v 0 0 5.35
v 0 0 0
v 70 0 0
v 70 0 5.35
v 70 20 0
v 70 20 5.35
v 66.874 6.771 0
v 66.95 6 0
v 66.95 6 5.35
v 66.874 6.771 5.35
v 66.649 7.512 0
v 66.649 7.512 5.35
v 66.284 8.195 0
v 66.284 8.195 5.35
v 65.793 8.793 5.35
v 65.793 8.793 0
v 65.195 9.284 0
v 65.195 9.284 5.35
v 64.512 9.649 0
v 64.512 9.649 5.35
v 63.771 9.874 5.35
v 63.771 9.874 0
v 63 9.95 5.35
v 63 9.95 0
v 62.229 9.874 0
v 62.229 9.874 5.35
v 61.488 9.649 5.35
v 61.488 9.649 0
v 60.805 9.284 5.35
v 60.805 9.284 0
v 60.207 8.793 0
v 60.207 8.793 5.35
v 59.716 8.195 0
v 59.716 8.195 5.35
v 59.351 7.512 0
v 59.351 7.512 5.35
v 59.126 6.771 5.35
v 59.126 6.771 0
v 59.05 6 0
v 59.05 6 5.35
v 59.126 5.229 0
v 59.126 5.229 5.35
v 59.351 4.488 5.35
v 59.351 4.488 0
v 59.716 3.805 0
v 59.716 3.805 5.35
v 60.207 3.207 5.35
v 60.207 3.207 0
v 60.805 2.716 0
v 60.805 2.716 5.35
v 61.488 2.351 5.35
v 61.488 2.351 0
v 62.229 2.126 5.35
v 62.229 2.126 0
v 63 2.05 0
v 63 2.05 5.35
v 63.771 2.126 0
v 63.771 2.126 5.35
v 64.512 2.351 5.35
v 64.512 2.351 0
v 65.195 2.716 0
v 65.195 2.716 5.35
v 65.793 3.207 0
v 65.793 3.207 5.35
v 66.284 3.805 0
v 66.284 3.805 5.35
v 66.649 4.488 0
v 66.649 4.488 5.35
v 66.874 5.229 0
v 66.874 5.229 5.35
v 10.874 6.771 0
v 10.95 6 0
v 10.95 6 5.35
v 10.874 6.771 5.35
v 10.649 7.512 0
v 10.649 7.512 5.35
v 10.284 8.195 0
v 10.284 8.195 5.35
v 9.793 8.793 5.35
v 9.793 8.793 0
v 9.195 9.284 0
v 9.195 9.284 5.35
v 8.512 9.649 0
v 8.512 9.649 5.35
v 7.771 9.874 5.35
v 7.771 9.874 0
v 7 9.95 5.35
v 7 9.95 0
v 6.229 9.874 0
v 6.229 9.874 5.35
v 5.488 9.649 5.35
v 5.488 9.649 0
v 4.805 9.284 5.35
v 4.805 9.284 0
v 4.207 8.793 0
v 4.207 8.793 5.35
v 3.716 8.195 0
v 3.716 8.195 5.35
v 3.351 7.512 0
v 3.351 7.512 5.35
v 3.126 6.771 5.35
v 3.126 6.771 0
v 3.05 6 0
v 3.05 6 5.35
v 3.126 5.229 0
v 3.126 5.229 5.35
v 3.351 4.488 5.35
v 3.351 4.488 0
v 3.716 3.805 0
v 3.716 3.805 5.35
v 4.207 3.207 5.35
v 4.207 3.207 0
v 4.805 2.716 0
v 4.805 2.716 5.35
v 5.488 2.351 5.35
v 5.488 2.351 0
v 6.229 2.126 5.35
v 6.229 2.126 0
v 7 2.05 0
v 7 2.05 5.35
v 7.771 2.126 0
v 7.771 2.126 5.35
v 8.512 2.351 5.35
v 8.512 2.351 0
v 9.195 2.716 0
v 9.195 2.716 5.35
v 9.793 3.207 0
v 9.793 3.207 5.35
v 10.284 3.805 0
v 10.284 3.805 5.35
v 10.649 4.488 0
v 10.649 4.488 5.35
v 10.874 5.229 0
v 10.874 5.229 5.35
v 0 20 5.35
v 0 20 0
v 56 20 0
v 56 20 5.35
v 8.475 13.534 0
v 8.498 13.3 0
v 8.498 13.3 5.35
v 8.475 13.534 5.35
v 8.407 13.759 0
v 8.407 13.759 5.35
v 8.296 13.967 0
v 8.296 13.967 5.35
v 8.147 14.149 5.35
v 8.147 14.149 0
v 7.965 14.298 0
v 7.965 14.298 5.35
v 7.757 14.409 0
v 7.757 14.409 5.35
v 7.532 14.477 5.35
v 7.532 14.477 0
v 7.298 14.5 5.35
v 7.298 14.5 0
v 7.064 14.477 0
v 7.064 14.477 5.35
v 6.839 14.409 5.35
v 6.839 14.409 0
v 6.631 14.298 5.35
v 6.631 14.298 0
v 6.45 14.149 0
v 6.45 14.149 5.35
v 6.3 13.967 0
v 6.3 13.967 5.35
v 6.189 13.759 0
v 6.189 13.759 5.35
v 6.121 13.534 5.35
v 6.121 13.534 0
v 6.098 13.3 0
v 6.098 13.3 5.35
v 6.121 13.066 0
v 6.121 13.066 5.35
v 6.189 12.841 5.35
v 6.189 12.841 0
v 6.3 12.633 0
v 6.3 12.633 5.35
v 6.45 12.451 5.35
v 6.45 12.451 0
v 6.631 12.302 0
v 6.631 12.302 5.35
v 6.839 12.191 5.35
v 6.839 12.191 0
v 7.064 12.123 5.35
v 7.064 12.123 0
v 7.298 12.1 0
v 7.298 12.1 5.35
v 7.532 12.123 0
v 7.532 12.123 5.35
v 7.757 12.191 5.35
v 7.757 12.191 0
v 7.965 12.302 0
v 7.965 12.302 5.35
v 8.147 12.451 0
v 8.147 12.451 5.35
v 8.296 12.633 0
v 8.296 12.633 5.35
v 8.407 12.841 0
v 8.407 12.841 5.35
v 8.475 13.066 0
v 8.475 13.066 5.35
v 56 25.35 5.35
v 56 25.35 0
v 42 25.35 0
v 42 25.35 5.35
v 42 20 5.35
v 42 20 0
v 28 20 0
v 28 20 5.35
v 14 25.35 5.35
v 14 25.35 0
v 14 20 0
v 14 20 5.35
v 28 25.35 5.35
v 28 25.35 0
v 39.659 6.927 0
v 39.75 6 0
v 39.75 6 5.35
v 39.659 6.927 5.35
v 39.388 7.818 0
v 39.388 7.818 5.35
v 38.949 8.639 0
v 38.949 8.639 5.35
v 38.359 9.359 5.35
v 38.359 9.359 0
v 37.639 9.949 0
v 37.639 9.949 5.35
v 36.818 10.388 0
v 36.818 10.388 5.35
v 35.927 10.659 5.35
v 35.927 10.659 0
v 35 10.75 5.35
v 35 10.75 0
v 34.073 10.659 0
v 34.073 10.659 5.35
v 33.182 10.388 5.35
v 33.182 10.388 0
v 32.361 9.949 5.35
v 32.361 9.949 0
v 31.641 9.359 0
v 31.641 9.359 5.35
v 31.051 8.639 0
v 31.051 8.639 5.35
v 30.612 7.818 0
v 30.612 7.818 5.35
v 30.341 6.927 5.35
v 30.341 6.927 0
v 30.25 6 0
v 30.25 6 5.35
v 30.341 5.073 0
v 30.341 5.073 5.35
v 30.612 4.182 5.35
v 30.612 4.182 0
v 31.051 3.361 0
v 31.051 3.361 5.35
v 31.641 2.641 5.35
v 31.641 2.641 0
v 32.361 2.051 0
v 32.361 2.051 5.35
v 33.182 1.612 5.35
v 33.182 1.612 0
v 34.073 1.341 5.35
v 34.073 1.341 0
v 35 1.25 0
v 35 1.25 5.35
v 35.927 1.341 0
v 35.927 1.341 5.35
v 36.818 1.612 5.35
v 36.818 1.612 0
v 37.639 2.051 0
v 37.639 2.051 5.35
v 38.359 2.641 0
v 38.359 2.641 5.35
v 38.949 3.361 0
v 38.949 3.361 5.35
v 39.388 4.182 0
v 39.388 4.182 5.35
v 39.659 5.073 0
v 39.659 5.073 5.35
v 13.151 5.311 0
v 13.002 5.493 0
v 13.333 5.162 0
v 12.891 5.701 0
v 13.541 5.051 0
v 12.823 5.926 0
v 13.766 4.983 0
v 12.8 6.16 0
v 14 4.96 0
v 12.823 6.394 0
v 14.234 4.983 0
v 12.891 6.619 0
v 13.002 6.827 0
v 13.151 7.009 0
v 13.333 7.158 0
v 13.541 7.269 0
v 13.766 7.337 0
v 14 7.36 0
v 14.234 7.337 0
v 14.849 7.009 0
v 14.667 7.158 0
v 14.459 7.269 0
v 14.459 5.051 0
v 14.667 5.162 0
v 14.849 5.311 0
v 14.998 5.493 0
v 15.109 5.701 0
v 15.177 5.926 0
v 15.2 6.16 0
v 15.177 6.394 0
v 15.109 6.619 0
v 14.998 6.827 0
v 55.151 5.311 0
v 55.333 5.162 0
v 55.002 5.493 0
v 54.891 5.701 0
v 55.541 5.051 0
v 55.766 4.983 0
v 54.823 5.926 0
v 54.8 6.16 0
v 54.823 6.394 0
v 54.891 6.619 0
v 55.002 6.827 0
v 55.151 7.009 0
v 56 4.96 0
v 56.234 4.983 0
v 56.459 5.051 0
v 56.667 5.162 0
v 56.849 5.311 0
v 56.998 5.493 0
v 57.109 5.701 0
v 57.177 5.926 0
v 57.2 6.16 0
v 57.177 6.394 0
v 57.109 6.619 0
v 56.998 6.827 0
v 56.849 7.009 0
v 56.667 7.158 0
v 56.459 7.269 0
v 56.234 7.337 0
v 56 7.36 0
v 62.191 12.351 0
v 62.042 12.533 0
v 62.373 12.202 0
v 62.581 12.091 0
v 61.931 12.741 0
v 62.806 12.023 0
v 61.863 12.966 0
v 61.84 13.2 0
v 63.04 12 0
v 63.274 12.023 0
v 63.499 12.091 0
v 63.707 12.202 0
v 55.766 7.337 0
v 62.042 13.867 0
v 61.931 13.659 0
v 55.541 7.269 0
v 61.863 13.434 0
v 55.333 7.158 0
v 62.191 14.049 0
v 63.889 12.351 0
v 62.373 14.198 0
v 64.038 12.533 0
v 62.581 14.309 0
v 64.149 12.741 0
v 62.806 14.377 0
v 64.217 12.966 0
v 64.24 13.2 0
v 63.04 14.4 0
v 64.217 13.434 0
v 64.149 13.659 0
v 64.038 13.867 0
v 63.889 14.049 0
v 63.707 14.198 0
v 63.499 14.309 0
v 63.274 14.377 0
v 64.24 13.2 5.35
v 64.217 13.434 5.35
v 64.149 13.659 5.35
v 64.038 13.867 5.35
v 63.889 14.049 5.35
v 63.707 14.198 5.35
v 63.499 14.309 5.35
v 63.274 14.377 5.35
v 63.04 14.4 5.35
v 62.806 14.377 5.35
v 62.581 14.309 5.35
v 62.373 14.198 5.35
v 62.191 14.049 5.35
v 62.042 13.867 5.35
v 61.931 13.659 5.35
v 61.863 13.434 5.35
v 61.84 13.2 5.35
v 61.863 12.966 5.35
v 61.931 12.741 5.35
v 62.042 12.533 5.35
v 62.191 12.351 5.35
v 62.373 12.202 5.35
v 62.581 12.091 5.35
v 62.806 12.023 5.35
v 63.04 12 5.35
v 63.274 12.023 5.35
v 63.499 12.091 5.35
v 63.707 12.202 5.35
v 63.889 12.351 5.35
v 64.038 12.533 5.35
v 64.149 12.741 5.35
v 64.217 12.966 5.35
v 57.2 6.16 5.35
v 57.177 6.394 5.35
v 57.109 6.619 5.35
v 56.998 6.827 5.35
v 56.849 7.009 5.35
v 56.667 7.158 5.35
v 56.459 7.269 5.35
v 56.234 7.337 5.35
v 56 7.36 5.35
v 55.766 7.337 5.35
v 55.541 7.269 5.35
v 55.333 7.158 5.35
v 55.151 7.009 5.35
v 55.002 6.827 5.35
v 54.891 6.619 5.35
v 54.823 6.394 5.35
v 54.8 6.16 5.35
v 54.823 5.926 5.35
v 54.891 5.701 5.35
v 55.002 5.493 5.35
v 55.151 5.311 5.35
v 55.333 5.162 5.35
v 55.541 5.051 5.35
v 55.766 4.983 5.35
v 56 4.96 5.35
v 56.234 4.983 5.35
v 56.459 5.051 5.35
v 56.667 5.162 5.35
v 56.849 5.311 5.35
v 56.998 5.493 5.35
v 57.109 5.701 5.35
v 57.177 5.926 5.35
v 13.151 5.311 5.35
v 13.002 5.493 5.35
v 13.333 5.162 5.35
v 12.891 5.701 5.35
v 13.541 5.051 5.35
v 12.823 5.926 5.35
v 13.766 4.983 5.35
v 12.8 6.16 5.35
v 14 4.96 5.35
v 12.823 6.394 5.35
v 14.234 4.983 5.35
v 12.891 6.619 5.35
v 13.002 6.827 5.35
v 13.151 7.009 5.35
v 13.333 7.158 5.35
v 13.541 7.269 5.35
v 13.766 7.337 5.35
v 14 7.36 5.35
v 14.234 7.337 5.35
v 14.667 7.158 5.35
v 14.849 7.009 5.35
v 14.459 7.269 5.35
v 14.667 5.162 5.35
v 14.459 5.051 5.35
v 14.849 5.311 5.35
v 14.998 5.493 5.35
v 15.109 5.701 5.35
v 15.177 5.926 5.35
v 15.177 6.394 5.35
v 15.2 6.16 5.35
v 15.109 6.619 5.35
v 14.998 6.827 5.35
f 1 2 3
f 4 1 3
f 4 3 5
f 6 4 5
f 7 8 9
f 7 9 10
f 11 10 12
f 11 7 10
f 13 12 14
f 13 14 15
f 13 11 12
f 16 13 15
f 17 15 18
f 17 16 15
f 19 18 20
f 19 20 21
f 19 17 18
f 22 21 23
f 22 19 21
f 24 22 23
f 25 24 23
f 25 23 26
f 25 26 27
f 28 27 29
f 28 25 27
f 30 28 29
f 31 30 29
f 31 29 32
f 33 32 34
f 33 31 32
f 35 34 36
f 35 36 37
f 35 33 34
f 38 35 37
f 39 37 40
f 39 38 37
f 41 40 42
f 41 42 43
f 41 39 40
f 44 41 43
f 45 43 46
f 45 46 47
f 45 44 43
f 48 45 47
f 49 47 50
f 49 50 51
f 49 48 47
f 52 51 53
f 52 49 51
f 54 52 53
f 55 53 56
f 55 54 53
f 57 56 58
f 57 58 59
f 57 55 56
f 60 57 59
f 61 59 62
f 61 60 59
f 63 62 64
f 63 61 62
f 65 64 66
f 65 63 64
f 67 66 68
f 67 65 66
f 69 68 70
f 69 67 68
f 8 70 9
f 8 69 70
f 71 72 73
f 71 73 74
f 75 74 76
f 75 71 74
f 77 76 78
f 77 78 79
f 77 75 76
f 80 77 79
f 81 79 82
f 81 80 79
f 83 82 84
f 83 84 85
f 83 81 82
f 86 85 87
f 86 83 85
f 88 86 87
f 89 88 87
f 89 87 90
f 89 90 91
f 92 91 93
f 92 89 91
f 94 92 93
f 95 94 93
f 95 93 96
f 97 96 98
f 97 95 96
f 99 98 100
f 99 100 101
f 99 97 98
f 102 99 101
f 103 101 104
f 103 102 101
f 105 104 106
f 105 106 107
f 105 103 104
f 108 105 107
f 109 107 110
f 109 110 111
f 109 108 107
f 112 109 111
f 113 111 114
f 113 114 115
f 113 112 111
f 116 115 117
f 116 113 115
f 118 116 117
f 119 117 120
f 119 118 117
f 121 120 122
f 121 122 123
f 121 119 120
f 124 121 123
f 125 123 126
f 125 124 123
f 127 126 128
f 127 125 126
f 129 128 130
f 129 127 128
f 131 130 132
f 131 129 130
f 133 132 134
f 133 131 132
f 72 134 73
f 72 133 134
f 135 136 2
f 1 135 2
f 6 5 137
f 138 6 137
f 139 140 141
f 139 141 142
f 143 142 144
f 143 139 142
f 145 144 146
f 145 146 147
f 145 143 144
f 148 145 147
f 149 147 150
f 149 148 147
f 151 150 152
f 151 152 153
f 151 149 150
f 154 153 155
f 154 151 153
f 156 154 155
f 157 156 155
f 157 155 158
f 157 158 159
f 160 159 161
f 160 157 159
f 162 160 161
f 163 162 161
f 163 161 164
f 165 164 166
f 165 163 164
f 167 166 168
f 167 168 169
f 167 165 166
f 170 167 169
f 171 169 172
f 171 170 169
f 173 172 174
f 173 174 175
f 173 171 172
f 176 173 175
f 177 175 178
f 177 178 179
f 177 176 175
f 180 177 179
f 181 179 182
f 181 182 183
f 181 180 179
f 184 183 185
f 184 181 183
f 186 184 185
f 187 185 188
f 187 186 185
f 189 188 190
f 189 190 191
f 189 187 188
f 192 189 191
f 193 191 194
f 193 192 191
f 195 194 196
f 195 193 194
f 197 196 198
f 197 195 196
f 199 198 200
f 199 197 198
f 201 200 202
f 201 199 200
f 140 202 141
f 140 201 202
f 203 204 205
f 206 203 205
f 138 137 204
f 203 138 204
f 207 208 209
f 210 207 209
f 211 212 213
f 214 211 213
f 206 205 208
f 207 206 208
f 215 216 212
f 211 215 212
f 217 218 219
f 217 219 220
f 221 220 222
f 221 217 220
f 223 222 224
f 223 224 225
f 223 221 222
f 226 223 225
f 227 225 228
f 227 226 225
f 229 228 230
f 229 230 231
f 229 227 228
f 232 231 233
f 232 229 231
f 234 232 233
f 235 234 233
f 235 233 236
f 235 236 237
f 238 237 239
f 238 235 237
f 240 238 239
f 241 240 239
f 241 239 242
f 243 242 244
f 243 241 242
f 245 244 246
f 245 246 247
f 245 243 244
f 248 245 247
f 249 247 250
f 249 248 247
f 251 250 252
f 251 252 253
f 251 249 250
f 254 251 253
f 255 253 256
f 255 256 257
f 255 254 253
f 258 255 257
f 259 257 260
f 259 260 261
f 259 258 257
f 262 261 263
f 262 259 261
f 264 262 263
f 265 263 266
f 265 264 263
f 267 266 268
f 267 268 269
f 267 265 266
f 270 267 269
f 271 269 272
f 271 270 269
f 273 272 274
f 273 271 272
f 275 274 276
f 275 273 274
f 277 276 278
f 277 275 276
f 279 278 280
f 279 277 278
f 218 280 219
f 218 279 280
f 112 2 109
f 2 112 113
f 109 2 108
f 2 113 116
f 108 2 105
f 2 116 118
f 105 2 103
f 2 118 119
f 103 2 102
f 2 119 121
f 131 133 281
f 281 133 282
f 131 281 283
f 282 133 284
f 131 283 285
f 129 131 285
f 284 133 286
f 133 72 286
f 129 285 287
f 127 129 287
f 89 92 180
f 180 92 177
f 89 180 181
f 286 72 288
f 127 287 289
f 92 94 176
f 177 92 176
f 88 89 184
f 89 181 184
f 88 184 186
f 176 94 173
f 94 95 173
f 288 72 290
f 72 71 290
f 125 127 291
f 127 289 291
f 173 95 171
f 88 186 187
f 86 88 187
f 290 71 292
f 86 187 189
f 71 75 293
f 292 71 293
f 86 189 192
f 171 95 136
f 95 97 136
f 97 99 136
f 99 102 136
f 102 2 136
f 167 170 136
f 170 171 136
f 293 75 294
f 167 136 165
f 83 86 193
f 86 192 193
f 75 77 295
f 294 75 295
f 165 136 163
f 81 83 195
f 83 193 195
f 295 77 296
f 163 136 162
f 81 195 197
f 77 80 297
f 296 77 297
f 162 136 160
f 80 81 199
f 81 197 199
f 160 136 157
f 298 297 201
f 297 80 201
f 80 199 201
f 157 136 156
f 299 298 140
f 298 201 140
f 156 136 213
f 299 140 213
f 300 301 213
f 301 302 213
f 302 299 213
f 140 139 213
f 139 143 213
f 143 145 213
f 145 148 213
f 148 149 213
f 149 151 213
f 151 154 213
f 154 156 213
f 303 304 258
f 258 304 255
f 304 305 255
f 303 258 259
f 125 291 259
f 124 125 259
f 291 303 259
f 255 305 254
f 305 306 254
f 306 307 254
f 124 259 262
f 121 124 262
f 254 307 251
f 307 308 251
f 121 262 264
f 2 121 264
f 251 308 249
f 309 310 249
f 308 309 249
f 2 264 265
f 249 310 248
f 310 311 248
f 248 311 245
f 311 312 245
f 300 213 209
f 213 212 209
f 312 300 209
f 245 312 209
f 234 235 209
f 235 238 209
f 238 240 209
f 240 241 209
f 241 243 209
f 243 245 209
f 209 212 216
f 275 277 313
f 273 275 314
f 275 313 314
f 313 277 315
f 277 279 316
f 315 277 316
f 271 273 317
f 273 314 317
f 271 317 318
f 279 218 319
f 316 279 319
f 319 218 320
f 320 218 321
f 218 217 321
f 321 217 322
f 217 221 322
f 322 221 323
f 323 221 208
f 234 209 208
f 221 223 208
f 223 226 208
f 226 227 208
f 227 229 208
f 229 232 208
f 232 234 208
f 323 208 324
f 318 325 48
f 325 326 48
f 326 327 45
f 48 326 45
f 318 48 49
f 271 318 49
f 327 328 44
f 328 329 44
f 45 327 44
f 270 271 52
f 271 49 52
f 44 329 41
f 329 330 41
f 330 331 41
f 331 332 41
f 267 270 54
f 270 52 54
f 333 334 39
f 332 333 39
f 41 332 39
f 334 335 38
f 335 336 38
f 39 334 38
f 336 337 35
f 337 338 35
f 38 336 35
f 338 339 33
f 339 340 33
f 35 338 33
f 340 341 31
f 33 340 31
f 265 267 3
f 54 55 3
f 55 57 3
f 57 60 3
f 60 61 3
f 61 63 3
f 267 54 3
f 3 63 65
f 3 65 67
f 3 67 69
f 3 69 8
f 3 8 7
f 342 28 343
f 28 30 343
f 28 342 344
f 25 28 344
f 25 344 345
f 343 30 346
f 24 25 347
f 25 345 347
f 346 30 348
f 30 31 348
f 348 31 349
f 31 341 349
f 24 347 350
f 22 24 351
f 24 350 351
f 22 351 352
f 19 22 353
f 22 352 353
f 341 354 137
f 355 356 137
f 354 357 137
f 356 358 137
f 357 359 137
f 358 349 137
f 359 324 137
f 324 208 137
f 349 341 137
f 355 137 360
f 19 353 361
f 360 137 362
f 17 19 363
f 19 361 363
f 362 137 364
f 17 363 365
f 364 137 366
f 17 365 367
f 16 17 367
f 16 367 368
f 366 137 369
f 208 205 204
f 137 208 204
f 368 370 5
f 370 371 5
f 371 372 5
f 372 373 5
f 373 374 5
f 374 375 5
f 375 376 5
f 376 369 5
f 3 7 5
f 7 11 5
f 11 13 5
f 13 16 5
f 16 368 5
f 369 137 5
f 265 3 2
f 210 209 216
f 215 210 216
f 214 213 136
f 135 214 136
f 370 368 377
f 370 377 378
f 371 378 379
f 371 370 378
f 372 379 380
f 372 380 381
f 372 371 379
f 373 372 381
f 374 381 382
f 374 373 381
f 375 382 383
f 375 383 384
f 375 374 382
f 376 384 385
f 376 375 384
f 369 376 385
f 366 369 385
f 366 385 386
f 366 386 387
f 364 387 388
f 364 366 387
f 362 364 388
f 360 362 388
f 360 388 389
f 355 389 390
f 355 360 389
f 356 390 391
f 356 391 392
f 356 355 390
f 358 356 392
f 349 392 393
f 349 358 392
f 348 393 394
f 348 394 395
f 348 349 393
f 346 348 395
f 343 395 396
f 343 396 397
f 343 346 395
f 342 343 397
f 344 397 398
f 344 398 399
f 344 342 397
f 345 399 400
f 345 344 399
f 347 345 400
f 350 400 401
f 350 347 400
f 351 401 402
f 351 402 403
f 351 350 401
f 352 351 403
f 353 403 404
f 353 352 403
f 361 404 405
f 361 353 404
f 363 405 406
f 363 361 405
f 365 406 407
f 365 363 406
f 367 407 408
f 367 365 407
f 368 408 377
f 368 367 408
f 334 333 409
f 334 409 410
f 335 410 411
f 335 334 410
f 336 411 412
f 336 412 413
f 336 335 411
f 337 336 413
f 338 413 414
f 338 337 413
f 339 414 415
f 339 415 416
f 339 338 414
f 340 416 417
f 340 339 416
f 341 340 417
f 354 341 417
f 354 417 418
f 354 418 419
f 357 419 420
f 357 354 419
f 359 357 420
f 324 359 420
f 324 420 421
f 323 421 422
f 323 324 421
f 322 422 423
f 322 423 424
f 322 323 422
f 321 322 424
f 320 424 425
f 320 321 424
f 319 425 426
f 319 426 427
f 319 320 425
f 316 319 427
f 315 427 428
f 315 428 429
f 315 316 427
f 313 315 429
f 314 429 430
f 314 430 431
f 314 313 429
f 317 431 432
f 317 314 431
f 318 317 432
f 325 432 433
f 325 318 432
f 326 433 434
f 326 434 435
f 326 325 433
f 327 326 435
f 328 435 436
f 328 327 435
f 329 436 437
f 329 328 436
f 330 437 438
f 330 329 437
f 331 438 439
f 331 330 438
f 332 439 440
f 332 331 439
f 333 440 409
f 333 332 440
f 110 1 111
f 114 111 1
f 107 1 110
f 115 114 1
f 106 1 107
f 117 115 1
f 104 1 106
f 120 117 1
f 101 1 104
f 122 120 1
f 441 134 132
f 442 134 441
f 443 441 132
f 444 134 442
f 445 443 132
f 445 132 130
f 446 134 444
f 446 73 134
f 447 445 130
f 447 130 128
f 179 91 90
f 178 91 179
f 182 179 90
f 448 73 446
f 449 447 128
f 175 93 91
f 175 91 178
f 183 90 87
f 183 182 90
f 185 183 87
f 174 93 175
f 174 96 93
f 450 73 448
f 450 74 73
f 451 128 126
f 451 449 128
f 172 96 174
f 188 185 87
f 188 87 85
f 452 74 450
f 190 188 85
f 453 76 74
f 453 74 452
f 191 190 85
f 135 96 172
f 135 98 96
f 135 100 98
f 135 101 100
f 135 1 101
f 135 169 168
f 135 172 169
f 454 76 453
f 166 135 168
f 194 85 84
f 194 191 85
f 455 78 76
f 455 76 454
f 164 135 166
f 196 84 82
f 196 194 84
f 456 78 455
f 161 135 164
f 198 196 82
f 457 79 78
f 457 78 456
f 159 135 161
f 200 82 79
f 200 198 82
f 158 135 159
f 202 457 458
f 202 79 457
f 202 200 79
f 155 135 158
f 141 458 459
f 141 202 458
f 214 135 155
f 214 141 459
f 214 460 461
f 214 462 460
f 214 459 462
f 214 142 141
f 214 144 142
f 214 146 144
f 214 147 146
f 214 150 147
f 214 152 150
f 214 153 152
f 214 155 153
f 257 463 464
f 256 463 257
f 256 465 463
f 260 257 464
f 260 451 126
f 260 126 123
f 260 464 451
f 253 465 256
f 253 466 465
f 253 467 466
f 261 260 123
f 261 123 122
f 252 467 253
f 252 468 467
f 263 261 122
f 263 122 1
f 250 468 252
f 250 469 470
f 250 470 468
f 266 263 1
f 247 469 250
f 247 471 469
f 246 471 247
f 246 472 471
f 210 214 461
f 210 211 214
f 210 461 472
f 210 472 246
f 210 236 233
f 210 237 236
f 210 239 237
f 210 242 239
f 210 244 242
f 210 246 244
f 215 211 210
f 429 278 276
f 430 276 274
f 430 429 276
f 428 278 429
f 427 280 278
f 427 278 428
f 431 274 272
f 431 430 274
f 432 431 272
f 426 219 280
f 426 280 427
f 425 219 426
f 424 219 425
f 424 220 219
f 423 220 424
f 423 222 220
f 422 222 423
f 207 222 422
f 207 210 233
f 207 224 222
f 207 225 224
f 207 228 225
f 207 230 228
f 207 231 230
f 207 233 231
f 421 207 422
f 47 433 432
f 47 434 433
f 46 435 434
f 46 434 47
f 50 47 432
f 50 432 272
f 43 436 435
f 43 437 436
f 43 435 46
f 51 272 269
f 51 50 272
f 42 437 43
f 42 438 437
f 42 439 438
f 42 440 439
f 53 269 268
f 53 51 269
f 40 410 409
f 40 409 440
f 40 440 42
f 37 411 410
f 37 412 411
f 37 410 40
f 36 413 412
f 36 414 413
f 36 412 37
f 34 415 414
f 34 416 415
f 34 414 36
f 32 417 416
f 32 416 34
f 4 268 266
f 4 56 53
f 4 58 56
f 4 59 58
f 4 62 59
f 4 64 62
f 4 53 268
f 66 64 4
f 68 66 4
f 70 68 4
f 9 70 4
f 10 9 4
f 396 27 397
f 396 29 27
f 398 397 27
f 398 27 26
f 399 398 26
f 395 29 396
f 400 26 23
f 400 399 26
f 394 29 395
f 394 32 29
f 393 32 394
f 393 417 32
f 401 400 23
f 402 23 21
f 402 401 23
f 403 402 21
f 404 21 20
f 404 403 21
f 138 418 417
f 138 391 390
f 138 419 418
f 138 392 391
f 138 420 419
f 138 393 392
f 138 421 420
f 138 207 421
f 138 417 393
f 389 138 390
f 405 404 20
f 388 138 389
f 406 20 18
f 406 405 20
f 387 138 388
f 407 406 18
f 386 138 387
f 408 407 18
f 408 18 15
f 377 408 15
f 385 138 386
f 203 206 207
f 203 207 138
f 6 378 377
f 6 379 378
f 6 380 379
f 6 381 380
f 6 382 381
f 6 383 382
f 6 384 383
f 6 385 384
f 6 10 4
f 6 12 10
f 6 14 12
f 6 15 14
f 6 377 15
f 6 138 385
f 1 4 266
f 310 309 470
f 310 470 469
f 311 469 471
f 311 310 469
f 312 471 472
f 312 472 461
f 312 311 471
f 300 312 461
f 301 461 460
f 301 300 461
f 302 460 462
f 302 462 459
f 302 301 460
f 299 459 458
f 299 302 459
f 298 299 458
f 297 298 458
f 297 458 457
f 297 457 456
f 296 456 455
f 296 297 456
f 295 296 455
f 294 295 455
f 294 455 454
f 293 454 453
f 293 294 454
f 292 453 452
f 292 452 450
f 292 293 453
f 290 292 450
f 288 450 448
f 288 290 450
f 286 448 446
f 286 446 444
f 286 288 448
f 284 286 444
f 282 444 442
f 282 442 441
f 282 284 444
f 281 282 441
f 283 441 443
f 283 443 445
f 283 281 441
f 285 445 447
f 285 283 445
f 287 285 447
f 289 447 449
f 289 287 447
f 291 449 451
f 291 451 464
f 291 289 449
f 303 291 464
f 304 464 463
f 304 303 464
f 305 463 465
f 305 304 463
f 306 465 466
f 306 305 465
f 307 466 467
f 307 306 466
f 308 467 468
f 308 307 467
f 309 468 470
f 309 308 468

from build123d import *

# Parameters (mm, degrees)
MODEL_R             = 4.75
MODEL_R_2           = 3.95
MODEL_R_3           = 1.2
BOSS_EXTRUDE1_DEPTH = 5.35


with BuildPart() as part:
    # Model → Boss-Extrude1 (new body)
    with BuildSketch(Plane.XY):
        Polygon((0, 19.999999553), (0, 0), (70.000000298, 0), (70.000000298, 19.999999553), (56.000001729, 19.999999553), (56.000001729, 25.349999778), (41.999999434, 25.349999778), (41.999999434, 19.999999553), (28.000000864, 19.999999553), (28.000000864, 25.349999778), (14.000000432, 25.349999778), (14.000000432, 19.999999553), align=None)
        with Locations((35, 5.999999553)):
            Circle(MODEL_R, mode=Mode.SUBTRACT)
        with Locations((63, 5.999999553)):
            Circle(MODEL_R_2, mode=Mode.SUBTRACT)
        with Locations((7, 5.999999553)):
            Circle(MODEL_R_2, mode=Mode.SUBTRACT)
        with Locations((14, 6.159999553)):
            Circle(MODEL_R_3, mode=Mode.SUBTRACT)
        with Locations((56, 6.159999553)):
            Circle(MODEL_R_3, mode=Mode.SUBTRACT)
        with Locations((63.04, 13.199999553)):
            Circle(MODEL_R_3, mode=Mode.SUBTRACT)
        with Locations((7.29808245, 13.299999553)):
            Circle(MODEL_R_3, mode=Mode.SUBTRACT)
    extrude(amount=BOSS_EXTRUDE1_DEPTH)


solid = part.part
